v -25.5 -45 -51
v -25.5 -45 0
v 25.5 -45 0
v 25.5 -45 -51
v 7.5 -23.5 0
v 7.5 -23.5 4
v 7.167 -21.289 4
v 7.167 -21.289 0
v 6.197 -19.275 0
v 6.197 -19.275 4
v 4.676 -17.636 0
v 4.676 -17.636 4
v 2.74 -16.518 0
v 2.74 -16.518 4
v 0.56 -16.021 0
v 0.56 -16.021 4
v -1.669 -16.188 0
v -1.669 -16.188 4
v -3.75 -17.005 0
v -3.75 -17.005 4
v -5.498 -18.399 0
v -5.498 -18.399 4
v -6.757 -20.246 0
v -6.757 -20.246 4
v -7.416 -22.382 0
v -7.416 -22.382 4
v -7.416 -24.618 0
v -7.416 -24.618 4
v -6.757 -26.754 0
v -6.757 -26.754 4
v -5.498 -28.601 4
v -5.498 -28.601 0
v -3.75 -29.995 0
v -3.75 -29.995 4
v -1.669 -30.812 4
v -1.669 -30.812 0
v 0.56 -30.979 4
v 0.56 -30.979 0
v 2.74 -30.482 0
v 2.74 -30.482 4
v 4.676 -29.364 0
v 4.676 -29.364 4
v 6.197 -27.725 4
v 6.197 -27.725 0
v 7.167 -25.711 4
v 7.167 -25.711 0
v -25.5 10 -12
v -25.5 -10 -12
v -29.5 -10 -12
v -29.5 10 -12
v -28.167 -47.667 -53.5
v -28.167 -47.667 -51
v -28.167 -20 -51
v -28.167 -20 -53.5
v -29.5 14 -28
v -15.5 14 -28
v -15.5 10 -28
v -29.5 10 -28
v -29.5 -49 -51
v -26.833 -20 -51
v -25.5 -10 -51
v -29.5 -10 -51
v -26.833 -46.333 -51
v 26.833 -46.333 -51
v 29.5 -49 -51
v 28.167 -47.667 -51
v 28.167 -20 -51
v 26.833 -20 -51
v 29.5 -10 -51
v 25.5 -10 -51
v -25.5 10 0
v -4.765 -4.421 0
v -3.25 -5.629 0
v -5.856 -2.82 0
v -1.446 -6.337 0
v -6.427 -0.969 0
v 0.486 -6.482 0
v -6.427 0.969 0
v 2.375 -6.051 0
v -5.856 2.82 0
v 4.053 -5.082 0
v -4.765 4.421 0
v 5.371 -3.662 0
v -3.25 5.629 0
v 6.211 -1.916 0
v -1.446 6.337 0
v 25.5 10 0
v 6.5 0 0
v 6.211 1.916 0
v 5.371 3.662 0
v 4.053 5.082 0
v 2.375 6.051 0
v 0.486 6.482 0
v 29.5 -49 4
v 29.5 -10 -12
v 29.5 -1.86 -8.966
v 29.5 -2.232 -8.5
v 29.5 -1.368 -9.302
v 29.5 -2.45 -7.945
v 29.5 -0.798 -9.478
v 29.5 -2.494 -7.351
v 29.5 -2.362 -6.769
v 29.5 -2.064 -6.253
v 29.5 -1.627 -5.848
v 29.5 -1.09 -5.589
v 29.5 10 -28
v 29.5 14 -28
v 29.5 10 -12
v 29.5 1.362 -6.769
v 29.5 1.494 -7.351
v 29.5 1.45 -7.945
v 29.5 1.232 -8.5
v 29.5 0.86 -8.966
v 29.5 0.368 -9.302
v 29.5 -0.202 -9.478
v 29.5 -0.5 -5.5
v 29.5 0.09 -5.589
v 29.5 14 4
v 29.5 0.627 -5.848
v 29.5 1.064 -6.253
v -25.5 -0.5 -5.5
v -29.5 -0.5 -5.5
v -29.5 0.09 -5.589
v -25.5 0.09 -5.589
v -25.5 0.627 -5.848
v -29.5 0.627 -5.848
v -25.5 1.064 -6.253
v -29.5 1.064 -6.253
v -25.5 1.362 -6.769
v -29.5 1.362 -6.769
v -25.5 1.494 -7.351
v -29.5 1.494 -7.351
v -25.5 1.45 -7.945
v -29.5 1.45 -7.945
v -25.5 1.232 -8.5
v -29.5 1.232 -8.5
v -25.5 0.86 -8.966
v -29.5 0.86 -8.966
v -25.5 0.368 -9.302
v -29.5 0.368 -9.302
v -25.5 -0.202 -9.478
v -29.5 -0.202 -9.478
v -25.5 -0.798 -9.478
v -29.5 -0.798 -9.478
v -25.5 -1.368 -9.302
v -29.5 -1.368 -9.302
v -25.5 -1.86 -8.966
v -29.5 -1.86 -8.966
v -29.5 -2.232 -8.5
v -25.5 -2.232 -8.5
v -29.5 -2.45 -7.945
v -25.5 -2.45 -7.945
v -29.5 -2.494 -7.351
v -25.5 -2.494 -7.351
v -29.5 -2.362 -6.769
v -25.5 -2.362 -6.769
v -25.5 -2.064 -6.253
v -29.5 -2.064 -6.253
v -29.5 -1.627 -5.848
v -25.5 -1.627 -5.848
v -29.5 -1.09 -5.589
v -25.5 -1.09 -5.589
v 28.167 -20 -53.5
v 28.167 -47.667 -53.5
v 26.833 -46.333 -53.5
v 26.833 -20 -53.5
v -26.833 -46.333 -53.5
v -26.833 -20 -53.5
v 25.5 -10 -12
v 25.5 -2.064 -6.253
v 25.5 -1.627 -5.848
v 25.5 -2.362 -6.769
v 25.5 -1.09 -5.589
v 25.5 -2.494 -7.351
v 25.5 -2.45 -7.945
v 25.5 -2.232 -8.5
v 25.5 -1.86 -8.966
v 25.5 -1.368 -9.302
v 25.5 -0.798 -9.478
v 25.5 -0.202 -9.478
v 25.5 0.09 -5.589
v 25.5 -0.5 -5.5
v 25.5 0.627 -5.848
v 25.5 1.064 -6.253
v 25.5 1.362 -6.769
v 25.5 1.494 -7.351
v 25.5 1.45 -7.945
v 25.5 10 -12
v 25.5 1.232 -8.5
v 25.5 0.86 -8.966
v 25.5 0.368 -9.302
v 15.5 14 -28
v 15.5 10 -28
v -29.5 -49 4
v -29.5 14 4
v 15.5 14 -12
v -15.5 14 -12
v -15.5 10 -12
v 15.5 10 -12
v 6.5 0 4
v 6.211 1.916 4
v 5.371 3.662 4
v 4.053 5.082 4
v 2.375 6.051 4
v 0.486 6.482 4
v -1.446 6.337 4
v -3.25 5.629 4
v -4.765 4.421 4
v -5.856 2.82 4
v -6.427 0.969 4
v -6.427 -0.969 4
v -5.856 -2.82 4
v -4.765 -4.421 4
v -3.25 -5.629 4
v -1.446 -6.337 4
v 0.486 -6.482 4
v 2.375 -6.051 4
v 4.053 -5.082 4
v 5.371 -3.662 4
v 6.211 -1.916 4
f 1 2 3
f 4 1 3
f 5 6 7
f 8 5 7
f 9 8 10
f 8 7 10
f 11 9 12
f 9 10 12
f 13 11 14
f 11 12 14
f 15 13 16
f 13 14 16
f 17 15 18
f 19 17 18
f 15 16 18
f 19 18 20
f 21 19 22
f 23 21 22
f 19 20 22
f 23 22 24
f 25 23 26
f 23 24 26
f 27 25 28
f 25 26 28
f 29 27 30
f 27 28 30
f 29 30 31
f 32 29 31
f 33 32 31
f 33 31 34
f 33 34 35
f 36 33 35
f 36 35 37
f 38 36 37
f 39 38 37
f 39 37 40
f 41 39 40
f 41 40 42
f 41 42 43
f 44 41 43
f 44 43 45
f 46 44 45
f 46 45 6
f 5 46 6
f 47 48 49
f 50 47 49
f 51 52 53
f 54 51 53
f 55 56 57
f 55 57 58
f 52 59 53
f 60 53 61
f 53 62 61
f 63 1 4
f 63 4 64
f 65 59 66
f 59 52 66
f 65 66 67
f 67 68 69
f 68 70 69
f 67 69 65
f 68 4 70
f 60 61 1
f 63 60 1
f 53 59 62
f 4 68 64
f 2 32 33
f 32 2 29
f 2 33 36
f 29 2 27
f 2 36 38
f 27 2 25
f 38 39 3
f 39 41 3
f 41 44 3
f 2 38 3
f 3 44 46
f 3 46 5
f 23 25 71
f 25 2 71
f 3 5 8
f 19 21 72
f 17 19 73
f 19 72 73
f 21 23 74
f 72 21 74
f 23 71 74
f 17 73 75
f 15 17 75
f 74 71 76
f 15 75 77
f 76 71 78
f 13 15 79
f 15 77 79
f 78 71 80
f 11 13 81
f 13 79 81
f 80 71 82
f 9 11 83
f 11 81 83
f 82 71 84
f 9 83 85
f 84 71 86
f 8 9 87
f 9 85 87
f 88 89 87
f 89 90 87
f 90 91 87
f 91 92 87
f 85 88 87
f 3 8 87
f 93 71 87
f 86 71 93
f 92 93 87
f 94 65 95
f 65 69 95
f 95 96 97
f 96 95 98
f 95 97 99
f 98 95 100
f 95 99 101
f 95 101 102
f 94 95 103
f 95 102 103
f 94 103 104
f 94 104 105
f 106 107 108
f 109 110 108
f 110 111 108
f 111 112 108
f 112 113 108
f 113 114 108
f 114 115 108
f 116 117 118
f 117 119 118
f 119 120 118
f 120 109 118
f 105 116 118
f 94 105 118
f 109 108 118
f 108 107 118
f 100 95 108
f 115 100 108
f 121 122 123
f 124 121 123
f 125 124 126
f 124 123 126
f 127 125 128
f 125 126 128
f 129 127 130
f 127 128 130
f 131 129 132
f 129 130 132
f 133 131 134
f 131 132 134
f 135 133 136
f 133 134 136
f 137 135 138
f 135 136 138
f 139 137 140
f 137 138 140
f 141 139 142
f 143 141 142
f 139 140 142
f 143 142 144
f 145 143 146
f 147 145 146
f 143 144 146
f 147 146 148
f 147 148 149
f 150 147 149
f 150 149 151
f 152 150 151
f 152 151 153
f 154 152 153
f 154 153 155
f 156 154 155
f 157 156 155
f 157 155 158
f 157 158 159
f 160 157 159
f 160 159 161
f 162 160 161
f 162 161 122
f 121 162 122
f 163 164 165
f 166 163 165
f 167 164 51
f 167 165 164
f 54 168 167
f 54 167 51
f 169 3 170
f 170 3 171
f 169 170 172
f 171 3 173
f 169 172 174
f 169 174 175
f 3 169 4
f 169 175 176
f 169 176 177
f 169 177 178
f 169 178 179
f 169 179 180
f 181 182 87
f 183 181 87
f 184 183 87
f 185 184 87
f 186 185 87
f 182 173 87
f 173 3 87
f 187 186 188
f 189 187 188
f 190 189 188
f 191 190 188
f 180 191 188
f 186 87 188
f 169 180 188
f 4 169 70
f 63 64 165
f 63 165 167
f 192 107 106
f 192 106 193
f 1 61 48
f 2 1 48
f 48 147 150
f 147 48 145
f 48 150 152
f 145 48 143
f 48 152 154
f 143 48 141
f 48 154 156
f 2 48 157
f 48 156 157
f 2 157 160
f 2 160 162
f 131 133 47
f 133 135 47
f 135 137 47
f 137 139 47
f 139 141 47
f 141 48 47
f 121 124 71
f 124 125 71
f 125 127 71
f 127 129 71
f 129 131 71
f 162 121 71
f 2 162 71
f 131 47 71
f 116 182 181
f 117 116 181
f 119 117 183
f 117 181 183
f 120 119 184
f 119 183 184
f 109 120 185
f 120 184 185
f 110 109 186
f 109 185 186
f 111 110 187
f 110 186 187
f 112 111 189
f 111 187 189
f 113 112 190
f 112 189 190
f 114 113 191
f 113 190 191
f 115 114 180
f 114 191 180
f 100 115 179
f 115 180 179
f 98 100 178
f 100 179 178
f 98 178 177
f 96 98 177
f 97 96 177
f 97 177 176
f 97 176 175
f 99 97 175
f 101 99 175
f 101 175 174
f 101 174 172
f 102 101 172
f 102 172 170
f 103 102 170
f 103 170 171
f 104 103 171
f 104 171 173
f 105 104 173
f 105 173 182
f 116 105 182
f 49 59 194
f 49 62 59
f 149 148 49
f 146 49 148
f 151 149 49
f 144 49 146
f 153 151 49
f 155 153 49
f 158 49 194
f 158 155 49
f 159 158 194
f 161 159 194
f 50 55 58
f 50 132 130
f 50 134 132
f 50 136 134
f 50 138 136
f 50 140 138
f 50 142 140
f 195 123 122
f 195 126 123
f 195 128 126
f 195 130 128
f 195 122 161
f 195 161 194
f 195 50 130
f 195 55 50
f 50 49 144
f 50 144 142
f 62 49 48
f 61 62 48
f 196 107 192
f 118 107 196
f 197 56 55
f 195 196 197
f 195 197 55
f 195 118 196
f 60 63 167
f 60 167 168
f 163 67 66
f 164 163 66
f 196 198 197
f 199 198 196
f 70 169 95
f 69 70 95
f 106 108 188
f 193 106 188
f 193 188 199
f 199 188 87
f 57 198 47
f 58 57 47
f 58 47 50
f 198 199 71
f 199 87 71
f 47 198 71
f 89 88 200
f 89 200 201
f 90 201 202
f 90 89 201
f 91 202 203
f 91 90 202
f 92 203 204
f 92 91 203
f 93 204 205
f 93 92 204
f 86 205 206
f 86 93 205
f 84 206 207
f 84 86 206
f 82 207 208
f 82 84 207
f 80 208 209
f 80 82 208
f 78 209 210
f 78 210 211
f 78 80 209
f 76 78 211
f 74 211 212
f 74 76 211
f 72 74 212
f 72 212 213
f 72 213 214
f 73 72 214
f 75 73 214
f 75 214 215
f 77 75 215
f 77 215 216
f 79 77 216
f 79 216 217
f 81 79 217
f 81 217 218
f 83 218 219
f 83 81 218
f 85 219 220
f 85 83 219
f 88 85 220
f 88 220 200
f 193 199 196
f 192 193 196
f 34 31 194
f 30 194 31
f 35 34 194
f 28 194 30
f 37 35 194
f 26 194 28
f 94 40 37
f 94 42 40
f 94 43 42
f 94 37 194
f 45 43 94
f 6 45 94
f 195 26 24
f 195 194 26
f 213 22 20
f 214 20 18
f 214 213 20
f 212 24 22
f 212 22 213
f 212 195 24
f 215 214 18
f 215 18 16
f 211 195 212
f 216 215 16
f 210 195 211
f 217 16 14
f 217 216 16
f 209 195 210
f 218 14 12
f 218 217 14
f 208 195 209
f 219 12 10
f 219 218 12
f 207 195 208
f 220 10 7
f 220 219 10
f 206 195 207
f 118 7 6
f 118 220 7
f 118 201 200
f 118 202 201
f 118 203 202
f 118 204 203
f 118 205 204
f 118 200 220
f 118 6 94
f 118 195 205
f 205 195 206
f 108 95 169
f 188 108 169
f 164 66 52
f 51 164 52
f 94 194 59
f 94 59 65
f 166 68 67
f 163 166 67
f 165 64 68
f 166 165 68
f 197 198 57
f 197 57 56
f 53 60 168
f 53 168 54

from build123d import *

# Parameters (mm, degrees)
SKETCH1_W           = 59
SKETCH1_H           = 20
SKETCH1_R           = 6.5
BOSS_EXTRUDE1_DEPTH = 4
SKETCH2_W           = 59
SKETCH2_H           = 16
BOSS_EXTRUDE2_DEPTH = 4
SKETCH3_W           = 14
SKETCH3_H           = 4
BOSS_EXTRUDE3_DEPTH = 16
SKETCH4_W           = 4
SKETCH4_H           = 20
BOSS_EXTRUDE4_DEPTH = 12
SKETCH5_R           = 2
CUT_EXTRUDE1_DEPTH  = 80
BOSS_EXTRUDE7_DEPTH = 35
SKETCH9_W           = 59
SKETCH9_H           = 55
BOSS_EXTRUDE8_DEPTH = 4
SKETCH10_W          = 55
SKETCH10_H          = 1.333333334
SKETCH10_W_2        = 1.333333334
SKETCH10_H_2        = 26.333333333
BOSS_EXTRUDE9_DEPTH = 2.5
SKETCH11_R          = 7.5
CUT_EXTRUDE2_DEPTH  = 5


with BuildPart() as part:
    # Sketch1 → Boss-Extrude1 (new body)
    with BuildSketch(Plane.XY):
        Rectangle(SKETCH1_W, SKETCH1_H)
        Circle(SKETCH1_R, mode=Mode.SUBTRACT)
    extrude(amount=BOSS_EXTRUDE1_DEPTH)

    # Sketch2 → Boss-Extrude2 (add)
    with BuildSketch(Plane(origin=(0, 10, 0), x_dir=(1, 0, 0), z_dir=(0, 1, 0))):
        with Locations((0, 4)):
            Rectangle(SKETCH2_W, SKETCH2_H)
    extrude(amount=BOSS_EXTRUDE2_DEPTH)

    # Sketch3 → Boss-Extrude3 (add)
    with BuildSketch(Plane(origin=(0, 0, -12), x_dir=(-1, 0, 0), z_dir=(0, 0, -1))):
        with Locations((-22.5, 12)):
            Rectangle(SKETCH3_W, SKETCH3_H)
        with Locations((22.5, 12)):
            Rectangle(SKETCH3_W, SKETCH3_H)
    extrude(amount=BOSS_EXTRUDE3_DEPTH)

    # Sketch4 → Boss-Extrude4 (add)
    with BuildSketch(Plane(origin=(0, 0, 0), x_dir=(-1, 0, 0), z_dir=(0, 0, -1))):
        with Locations((27.5, 0)):
            Rectangle(SKETCH4_W, SKETCH4_H)
        with Locations((-27.5, 0)):
            Rectangle(SKETCH4_W, SKETCH4_H)
    extrude(amount=BOSS_EXTRUDE4_DEPTH)

    # Sketch5 → Cut-Extrude1 (cut)
    with BuildSketch(Plane.ZY.offset(29.5)):
        with Locations((-7.5, -0.5)):
            Circle(SKETCH5_R)
    extrude(amount=-CUT_EXTRUDE1_DEPTH, mode=Mode.SUBTRACT)

    # Sketch8 → Boss-Extrude7 (add)
    with BuildSketch(Plane.XZ.offset(10)):
        Polygon((25.5, -51), (29.5, -51), (29.5, 4), (-29.5, 4), (-29.5, -51), (-25.5, -51), (-25.5, 0), (25.5, 0), align=None)
    extrude(amount=BOSS_EXTRUDE7_DEPTH)

    # Sketch9 → Boss-Extrude8 (add)
    with BuildSketch(Plane.XZ.offset(45)):
        with Locations((0, -23.5)):
            Rectangle(SKETCH9_W, SKETCH9_H)
    extrude(amount=BOSS_EXTRUDE8_DEPTH)

    # Sketch10 → Boss-Extrude9 (add)
    with BuildSketch(Plane(origin=(0, 0, -51), x_dir=(-1, 0, 0), z_dir=(0, 0, -1))):
        Polygon((-28.166666667, -47.666666667), (-26.833333333, -47.666666667), (-26.833333333, -46.333333333), (-26.833333333, -20), (-28.166666667, -20), align=None)
        with Locations((0.666666667, -47)):
            Rectangle(SKETCH10_W, SKETCH10_H)
        with Locations((27.5, -33.166666667)):
            Rectangle(SKETCH10_W_2, SKETCH10_H_2)
    extrude(amount=BOSS_EXTRUDE9_DEPTH)

    # Sketch11 → Cut-Extrude2 (cut)
    with BuildSketch(Plane.XY.offset(4)):
        with Locations((0, -23.5)):
            Circle(SKETCH11_R)
    extrude(amount=-CUT_EXTRUDE2_DEPTH, mode=Mode.SUBTRACT)


solid = part.part
